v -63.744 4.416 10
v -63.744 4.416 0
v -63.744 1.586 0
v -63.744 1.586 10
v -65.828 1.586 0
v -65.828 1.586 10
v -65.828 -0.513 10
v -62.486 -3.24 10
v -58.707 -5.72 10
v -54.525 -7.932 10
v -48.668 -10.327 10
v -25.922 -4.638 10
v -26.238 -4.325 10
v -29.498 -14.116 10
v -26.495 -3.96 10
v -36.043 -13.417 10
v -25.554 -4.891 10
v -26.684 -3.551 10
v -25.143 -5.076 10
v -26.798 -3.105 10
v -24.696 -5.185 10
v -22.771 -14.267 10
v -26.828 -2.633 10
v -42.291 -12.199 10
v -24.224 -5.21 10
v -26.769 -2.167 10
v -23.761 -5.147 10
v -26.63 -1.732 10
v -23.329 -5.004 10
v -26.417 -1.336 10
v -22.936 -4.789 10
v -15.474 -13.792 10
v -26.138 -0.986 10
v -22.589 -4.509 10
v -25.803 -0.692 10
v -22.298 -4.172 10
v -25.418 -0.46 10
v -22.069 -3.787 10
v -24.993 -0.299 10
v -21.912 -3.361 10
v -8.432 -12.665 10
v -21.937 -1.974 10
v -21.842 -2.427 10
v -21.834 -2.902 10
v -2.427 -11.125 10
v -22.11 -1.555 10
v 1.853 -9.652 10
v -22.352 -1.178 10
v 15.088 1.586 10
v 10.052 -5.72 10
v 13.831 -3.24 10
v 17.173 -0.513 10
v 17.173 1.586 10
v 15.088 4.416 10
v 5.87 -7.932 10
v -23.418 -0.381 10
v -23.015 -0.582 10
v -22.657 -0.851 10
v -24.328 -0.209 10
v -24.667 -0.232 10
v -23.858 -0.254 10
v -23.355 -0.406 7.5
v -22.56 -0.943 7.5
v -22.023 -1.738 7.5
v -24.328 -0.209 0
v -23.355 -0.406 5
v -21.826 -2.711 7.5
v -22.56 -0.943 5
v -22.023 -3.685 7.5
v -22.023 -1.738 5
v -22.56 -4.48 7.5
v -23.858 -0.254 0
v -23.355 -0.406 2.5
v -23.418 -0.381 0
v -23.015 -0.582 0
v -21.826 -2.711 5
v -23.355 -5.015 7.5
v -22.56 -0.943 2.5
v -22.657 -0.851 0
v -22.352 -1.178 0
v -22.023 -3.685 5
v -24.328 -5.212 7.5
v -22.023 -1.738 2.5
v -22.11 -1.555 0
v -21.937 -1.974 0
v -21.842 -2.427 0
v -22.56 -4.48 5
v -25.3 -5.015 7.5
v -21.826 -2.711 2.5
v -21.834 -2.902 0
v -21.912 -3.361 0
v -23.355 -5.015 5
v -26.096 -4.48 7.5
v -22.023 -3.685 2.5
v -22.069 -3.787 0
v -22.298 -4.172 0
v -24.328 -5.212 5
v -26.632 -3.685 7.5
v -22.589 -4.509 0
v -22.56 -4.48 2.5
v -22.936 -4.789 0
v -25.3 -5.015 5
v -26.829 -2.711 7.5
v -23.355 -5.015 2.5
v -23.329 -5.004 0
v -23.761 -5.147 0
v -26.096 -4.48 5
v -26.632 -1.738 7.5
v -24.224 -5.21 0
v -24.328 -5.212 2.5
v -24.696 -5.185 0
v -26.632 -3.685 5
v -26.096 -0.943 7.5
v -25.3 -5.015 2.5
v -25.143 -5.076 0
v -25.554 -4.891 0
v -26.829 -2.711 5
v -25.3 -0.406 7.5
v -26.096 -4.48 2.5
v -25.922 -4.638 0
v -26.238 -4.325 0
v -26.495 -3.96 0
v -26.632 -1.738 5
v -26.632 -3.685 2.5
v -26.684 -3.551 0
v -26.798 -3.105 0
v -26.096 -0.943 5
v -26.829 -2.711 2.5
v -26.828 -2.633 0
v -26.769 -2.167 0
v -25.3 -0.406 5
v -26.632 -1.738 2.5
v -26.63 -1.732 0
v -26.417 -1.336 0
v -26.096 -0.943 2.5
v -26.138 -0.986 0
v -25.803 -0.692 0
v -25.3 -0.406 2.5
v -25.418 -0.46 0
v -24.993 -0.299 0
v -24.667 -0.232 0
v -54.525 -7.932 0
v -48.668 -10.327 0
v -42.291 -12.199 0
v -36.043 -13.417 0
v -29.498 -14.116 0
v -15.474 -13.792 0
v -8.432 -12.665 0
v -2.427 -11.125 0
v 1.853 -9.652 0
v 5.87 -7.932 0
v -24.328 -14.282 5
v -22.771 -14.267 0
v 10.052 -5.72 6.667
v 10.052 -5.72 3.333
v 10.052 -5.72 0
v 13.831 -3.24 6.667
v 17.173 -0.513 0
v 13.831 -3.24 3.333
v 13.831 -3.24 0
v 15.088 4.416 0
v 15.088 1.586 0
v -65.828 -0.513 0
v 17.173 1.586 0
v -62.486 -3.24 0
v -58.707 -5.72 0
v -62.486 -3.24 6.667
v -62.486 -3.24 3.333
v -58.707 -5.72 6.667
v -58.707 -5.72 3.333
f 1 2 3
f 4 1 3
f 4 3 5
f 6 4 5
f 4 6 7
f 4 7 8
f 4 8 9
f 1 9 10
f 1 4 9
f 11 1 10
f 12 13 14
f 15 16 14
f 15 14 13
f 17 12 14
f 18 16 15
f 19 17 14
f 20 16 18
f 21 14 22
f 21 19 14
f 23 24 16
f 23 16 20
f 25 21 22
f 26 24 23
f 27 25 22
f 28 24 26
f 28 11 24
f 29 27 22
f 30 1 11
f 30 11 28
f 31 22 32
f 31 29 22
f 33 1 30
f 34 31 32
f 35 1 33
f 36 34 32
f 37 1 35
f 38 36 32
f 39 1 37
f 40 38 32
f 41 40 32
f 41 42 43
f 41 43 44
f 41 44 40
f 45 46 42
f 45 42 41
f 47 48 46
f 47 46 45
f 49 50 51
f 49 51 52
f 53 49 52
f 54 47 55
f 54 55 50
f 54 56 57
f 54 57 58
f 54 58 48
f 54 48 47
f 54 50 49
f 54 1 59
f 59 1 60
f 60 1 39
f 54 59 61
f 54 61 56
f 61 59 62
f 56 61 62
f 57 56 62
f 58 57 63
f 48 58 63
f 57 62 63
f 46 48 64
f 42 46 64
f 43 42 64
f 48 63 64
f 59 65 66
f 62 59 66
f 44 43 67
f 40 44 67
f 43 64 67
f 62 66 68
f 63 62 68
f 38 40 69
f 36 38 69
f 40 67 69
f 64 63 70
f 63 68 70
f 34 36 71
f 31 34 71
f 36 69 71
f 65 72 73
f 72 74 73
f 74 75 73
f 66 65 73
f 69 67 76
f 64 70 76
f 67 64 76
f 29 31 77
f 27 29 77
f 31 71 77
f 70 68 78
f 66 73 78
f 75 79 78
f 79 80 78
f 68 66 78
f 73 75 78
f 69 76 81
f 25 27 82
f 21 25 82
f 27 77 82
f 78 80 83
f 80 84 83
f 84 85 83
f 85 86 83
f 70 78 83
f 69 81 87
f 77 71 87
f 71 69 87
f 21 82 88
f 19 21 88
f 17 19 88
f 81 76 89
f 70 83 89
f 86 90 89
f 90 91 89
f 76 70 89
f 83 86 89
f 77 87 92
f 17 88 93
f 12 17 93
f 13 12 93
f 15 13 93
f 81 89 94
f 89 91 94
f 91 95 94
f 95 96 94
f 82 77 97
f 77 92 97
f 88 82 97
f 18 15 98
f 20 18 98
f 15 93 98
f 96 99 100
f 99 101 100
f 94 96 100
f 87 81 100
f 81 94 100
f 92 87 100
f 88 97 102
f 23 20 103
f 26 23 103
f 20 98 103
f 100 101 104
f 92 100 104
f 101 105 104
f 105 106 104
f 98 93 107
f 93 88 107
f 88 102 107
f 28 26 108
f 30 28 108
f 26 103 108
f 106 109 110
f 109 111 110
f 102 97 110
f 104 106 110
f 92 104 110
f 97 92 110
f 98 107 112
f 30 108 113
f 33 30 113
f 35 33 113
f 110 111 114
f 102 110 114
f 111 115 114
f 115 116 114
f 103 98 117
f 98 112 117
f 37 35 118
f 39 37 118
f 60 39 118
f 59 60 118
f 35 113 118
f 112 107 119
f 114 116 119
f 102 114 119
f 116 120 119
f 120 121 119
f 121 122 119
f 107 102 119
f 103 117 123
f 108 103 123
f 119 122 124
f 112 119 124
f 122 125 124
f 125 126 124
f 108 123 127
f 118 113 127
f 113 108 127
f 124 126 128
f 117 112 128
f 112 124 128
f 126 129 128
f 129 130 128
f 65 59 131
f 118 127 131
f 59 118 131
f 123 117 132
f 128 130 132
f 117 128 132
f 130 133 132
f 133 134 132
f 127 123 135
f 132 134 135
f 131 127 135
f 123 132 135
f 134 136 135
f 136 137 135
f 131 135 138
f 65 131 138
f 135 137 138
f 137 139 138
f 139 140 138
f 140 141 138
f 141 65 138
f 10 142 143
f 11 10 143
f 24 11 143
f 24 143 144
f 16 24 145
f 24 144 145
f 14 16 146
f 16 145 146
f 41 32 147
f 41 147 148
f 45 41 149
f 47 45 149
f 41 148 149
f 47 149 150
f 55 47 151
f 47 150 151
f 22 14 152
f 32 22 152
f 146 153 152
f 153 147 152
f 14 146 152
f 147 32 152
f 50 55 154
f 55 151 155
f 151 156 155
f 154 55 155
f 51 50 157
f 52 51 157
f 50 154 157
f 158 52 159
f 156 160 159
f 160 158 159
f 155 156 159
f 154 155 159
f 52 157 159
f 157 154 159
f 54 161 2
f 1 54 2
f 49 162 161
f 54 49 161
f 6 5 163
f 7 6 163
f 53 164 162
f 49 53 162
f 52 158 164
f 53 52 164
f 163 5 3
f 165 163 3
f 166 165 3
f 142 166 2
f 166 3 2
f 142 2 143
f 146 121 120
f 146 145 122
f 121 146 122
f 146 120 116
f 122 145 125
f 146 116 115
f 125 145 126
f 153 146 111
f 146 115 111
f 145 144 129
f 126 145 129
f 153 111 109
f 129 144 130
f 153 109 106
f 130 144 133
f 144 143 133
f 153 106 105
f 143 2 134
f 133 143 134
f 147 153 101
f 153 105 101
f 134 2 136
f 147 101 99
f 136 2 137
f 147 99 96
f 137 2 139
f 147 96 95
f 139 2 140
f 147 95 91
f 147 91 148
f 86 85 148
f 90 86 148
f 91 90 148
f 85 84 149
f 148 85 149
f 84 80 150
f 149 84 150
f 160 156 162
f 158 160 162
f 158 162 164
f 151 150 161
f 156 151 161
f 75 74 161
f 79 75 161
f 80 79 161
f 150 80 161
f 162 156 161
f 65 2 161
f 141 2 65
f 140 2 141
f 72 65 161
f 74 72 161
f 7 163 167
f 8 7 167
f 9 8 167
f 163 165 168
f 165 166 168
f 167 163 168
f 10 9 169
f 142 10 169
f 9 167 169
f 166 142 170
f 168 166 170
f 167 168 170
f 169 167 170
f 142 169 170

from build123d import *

# Parameters (mm, degrees)
EXTRUDE_1_DEPTH = 10


with BuildPart() as part:
    # 草图1 → 凸台-拉伸1 (new body)
    with BuildSketch(Plane.XY):
        with BuildLine():
            Line((15.08818867, 1.586238016), (15.08818867, 4.415501152))
            Line((15.08818867, 4.415501152), (-63.743519752, 4.415501152))
            Line((-63.743519752, 4.415501152), (-63.743519752, 1.586238016))
            Line((-63.743519752, 1.586238016), (-65.828448476, 1.586238016))
            Line((-65.828448476, 1.586238016), (-65.828448476, -0.512794067))
            add(Edge.make_bspline(
                [(-65.828448476, -0.512794067), (-62.716945893, -3.356182094), (-58.896356532, -5.860917235), (-54.525434698, -7.931721067)],
                knots=[5, 5, 5, 5, 6, 6, 6, 6], degree=3))
            add(Edge.make_bspline(
                [(-54.525434698, -7.931721067), (-46.10816209, -11.921636872), (-35.651823592, -14.281721066), (-24.327665541, -14.281721066)],
                knots=[6, 6, 6, 6, 7, 7, 7, 7], degree=3))
            add(Edge.make_bspline(
                [(-24.327665541, -14.281721066), (-13.00350749, -14.281721066), (-2.547168991, -11.921636872), (5.870103617, -7.931721067)],
                knots=[7, 7, 7, 7, 8, 8, 8, 8], degree=3))
            add(Edge.make_bspline(
                [(5.870103617, -7.931721067), (10.24102545, -5.860917235), (14.061614811, -3.356182094), (17.173117394, -0.512794067)],
                knots=[8, 8, 8, 8, 9, 9, 9, 9], degree=3))
            Line((17.173117394, -0.512794067), (17.173117394, 1.586238016))
            Line((17.173117394, 1.586238016), (15.08818867, 1.586238016))
        make_face()
        with BuildLine():
            add(Edge.make_bspline(
                [(-24.327665541, -5.21179665), (-25.707038709, -5.21179665), (-26.828869459, -4.093497123), (-26.828869459, -2.710614264), (-26.828869459, -1.331241095), (-25.707038709, -0.209410346), (-24.327665541, -0.209410346)],
                knots=[2, 2, 2, 2, 3, 3, 3, 4, 4, 4, 4], degree=3))
            add(Edge.make_bspline(
                [(-24.327665541, -0.209410346), (-22.948313904, -0.209410346), (-21.826483155, -1.331241095), (-21.826483155, -2.710614264), (-21.826483155, -4.093497123), (-22.948313904, -5.21179665), (-24.327665541, -5.21179665)],
                knots=[0, 0, 0, 0, 1, 1, 1, 2, 2, 2, 2], degree=3))
        make_face(mode=Mode.SUBTRACT)
    extrude(amount=EXTRUDE_1_DEPTH)


solid = part.part
